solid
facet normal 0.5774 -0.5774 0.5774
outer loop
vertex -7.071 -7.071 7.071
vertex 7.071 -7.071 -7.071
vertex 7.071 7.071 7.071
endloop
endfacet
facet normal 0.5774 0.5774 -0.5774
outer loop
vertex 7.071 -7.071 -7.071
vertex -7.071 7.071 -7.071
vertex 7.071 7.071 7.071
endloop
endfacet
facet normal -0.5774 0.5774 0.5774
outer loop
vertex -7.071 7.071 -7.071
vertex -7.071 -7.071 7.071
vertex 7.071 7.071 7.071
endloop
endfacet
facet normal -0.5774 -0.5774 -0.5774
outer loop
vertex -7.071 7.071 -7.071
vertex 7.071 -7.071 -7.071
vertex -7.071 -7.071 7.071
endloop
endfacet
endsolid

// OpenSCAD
// Regular Tetrahedron
// (C) @oblomobka - 2023.05
// GPL license

/* **CUSTOMIZER VARIABLES** */
// Edge
edge = 20; //[10:100]
// Center of the solid or stand over a face
position = "Center"; //["Center", "Face"]

/* **MODULES** */
module TetrahedronRegular (edge=20, position="Face"){ 
    
    // Invariants
    diAngleTetrahedron = acos(1/3); // dihedral angle of tetrahedron = 70.529
    
    // Relations
    rCirTetrahedron = sqrt(6)/4; // radius of a circumscribed sphere for edge = 1 / = 0,612...
    rInsTetrahedron = 1/sqrt(24); // radius of a inscribed sphere for edge = 1 / = 0,204
    rMidTetrahedron = 1/sqrt(8); // Midradius, which touches the middle of each edge / =354...
    hTetrahedron = sqrt(6)/3;
    
    // Variables
    a = edge/(2*sqrt(2));
    
    // Definition of points and faces V = 4 / F = 4
    Tpoints = [
        // Half of the vertices of a cube
        [+a, +a, +a], [-a, -a, +a],      // UP       [  0,  1]
        [-a, +a, -a], [+a, -a, -a],      // DOWN     [  2,  3]
        ];
    
    Tfaces= [
        [ 0, 3, 1], [ 0, 2, 3], [ 0, 1, 2], [ 1, 3, 2]
        ];
    
    // Polyhedron stands on xy plane centered on the center of the face or centered on the center of polyhedron
    if(position=="Face"){
        translate([0,0,edge*(hTetrahedron-rCirTetrahedron)])
            rotate([90-diAngleTetrahedron/2, 0, 0])
                rotate([0, 0, 45])
                    polyhedron(Tpoints,Tfaces);}
    else if(position=="Center") {
        polyhedron(Tpoints,Tfaces);} 
}


/* **RENDERING OF SOLIDS** */ 
TetrahedronRegular (edge = edge, position = position);
